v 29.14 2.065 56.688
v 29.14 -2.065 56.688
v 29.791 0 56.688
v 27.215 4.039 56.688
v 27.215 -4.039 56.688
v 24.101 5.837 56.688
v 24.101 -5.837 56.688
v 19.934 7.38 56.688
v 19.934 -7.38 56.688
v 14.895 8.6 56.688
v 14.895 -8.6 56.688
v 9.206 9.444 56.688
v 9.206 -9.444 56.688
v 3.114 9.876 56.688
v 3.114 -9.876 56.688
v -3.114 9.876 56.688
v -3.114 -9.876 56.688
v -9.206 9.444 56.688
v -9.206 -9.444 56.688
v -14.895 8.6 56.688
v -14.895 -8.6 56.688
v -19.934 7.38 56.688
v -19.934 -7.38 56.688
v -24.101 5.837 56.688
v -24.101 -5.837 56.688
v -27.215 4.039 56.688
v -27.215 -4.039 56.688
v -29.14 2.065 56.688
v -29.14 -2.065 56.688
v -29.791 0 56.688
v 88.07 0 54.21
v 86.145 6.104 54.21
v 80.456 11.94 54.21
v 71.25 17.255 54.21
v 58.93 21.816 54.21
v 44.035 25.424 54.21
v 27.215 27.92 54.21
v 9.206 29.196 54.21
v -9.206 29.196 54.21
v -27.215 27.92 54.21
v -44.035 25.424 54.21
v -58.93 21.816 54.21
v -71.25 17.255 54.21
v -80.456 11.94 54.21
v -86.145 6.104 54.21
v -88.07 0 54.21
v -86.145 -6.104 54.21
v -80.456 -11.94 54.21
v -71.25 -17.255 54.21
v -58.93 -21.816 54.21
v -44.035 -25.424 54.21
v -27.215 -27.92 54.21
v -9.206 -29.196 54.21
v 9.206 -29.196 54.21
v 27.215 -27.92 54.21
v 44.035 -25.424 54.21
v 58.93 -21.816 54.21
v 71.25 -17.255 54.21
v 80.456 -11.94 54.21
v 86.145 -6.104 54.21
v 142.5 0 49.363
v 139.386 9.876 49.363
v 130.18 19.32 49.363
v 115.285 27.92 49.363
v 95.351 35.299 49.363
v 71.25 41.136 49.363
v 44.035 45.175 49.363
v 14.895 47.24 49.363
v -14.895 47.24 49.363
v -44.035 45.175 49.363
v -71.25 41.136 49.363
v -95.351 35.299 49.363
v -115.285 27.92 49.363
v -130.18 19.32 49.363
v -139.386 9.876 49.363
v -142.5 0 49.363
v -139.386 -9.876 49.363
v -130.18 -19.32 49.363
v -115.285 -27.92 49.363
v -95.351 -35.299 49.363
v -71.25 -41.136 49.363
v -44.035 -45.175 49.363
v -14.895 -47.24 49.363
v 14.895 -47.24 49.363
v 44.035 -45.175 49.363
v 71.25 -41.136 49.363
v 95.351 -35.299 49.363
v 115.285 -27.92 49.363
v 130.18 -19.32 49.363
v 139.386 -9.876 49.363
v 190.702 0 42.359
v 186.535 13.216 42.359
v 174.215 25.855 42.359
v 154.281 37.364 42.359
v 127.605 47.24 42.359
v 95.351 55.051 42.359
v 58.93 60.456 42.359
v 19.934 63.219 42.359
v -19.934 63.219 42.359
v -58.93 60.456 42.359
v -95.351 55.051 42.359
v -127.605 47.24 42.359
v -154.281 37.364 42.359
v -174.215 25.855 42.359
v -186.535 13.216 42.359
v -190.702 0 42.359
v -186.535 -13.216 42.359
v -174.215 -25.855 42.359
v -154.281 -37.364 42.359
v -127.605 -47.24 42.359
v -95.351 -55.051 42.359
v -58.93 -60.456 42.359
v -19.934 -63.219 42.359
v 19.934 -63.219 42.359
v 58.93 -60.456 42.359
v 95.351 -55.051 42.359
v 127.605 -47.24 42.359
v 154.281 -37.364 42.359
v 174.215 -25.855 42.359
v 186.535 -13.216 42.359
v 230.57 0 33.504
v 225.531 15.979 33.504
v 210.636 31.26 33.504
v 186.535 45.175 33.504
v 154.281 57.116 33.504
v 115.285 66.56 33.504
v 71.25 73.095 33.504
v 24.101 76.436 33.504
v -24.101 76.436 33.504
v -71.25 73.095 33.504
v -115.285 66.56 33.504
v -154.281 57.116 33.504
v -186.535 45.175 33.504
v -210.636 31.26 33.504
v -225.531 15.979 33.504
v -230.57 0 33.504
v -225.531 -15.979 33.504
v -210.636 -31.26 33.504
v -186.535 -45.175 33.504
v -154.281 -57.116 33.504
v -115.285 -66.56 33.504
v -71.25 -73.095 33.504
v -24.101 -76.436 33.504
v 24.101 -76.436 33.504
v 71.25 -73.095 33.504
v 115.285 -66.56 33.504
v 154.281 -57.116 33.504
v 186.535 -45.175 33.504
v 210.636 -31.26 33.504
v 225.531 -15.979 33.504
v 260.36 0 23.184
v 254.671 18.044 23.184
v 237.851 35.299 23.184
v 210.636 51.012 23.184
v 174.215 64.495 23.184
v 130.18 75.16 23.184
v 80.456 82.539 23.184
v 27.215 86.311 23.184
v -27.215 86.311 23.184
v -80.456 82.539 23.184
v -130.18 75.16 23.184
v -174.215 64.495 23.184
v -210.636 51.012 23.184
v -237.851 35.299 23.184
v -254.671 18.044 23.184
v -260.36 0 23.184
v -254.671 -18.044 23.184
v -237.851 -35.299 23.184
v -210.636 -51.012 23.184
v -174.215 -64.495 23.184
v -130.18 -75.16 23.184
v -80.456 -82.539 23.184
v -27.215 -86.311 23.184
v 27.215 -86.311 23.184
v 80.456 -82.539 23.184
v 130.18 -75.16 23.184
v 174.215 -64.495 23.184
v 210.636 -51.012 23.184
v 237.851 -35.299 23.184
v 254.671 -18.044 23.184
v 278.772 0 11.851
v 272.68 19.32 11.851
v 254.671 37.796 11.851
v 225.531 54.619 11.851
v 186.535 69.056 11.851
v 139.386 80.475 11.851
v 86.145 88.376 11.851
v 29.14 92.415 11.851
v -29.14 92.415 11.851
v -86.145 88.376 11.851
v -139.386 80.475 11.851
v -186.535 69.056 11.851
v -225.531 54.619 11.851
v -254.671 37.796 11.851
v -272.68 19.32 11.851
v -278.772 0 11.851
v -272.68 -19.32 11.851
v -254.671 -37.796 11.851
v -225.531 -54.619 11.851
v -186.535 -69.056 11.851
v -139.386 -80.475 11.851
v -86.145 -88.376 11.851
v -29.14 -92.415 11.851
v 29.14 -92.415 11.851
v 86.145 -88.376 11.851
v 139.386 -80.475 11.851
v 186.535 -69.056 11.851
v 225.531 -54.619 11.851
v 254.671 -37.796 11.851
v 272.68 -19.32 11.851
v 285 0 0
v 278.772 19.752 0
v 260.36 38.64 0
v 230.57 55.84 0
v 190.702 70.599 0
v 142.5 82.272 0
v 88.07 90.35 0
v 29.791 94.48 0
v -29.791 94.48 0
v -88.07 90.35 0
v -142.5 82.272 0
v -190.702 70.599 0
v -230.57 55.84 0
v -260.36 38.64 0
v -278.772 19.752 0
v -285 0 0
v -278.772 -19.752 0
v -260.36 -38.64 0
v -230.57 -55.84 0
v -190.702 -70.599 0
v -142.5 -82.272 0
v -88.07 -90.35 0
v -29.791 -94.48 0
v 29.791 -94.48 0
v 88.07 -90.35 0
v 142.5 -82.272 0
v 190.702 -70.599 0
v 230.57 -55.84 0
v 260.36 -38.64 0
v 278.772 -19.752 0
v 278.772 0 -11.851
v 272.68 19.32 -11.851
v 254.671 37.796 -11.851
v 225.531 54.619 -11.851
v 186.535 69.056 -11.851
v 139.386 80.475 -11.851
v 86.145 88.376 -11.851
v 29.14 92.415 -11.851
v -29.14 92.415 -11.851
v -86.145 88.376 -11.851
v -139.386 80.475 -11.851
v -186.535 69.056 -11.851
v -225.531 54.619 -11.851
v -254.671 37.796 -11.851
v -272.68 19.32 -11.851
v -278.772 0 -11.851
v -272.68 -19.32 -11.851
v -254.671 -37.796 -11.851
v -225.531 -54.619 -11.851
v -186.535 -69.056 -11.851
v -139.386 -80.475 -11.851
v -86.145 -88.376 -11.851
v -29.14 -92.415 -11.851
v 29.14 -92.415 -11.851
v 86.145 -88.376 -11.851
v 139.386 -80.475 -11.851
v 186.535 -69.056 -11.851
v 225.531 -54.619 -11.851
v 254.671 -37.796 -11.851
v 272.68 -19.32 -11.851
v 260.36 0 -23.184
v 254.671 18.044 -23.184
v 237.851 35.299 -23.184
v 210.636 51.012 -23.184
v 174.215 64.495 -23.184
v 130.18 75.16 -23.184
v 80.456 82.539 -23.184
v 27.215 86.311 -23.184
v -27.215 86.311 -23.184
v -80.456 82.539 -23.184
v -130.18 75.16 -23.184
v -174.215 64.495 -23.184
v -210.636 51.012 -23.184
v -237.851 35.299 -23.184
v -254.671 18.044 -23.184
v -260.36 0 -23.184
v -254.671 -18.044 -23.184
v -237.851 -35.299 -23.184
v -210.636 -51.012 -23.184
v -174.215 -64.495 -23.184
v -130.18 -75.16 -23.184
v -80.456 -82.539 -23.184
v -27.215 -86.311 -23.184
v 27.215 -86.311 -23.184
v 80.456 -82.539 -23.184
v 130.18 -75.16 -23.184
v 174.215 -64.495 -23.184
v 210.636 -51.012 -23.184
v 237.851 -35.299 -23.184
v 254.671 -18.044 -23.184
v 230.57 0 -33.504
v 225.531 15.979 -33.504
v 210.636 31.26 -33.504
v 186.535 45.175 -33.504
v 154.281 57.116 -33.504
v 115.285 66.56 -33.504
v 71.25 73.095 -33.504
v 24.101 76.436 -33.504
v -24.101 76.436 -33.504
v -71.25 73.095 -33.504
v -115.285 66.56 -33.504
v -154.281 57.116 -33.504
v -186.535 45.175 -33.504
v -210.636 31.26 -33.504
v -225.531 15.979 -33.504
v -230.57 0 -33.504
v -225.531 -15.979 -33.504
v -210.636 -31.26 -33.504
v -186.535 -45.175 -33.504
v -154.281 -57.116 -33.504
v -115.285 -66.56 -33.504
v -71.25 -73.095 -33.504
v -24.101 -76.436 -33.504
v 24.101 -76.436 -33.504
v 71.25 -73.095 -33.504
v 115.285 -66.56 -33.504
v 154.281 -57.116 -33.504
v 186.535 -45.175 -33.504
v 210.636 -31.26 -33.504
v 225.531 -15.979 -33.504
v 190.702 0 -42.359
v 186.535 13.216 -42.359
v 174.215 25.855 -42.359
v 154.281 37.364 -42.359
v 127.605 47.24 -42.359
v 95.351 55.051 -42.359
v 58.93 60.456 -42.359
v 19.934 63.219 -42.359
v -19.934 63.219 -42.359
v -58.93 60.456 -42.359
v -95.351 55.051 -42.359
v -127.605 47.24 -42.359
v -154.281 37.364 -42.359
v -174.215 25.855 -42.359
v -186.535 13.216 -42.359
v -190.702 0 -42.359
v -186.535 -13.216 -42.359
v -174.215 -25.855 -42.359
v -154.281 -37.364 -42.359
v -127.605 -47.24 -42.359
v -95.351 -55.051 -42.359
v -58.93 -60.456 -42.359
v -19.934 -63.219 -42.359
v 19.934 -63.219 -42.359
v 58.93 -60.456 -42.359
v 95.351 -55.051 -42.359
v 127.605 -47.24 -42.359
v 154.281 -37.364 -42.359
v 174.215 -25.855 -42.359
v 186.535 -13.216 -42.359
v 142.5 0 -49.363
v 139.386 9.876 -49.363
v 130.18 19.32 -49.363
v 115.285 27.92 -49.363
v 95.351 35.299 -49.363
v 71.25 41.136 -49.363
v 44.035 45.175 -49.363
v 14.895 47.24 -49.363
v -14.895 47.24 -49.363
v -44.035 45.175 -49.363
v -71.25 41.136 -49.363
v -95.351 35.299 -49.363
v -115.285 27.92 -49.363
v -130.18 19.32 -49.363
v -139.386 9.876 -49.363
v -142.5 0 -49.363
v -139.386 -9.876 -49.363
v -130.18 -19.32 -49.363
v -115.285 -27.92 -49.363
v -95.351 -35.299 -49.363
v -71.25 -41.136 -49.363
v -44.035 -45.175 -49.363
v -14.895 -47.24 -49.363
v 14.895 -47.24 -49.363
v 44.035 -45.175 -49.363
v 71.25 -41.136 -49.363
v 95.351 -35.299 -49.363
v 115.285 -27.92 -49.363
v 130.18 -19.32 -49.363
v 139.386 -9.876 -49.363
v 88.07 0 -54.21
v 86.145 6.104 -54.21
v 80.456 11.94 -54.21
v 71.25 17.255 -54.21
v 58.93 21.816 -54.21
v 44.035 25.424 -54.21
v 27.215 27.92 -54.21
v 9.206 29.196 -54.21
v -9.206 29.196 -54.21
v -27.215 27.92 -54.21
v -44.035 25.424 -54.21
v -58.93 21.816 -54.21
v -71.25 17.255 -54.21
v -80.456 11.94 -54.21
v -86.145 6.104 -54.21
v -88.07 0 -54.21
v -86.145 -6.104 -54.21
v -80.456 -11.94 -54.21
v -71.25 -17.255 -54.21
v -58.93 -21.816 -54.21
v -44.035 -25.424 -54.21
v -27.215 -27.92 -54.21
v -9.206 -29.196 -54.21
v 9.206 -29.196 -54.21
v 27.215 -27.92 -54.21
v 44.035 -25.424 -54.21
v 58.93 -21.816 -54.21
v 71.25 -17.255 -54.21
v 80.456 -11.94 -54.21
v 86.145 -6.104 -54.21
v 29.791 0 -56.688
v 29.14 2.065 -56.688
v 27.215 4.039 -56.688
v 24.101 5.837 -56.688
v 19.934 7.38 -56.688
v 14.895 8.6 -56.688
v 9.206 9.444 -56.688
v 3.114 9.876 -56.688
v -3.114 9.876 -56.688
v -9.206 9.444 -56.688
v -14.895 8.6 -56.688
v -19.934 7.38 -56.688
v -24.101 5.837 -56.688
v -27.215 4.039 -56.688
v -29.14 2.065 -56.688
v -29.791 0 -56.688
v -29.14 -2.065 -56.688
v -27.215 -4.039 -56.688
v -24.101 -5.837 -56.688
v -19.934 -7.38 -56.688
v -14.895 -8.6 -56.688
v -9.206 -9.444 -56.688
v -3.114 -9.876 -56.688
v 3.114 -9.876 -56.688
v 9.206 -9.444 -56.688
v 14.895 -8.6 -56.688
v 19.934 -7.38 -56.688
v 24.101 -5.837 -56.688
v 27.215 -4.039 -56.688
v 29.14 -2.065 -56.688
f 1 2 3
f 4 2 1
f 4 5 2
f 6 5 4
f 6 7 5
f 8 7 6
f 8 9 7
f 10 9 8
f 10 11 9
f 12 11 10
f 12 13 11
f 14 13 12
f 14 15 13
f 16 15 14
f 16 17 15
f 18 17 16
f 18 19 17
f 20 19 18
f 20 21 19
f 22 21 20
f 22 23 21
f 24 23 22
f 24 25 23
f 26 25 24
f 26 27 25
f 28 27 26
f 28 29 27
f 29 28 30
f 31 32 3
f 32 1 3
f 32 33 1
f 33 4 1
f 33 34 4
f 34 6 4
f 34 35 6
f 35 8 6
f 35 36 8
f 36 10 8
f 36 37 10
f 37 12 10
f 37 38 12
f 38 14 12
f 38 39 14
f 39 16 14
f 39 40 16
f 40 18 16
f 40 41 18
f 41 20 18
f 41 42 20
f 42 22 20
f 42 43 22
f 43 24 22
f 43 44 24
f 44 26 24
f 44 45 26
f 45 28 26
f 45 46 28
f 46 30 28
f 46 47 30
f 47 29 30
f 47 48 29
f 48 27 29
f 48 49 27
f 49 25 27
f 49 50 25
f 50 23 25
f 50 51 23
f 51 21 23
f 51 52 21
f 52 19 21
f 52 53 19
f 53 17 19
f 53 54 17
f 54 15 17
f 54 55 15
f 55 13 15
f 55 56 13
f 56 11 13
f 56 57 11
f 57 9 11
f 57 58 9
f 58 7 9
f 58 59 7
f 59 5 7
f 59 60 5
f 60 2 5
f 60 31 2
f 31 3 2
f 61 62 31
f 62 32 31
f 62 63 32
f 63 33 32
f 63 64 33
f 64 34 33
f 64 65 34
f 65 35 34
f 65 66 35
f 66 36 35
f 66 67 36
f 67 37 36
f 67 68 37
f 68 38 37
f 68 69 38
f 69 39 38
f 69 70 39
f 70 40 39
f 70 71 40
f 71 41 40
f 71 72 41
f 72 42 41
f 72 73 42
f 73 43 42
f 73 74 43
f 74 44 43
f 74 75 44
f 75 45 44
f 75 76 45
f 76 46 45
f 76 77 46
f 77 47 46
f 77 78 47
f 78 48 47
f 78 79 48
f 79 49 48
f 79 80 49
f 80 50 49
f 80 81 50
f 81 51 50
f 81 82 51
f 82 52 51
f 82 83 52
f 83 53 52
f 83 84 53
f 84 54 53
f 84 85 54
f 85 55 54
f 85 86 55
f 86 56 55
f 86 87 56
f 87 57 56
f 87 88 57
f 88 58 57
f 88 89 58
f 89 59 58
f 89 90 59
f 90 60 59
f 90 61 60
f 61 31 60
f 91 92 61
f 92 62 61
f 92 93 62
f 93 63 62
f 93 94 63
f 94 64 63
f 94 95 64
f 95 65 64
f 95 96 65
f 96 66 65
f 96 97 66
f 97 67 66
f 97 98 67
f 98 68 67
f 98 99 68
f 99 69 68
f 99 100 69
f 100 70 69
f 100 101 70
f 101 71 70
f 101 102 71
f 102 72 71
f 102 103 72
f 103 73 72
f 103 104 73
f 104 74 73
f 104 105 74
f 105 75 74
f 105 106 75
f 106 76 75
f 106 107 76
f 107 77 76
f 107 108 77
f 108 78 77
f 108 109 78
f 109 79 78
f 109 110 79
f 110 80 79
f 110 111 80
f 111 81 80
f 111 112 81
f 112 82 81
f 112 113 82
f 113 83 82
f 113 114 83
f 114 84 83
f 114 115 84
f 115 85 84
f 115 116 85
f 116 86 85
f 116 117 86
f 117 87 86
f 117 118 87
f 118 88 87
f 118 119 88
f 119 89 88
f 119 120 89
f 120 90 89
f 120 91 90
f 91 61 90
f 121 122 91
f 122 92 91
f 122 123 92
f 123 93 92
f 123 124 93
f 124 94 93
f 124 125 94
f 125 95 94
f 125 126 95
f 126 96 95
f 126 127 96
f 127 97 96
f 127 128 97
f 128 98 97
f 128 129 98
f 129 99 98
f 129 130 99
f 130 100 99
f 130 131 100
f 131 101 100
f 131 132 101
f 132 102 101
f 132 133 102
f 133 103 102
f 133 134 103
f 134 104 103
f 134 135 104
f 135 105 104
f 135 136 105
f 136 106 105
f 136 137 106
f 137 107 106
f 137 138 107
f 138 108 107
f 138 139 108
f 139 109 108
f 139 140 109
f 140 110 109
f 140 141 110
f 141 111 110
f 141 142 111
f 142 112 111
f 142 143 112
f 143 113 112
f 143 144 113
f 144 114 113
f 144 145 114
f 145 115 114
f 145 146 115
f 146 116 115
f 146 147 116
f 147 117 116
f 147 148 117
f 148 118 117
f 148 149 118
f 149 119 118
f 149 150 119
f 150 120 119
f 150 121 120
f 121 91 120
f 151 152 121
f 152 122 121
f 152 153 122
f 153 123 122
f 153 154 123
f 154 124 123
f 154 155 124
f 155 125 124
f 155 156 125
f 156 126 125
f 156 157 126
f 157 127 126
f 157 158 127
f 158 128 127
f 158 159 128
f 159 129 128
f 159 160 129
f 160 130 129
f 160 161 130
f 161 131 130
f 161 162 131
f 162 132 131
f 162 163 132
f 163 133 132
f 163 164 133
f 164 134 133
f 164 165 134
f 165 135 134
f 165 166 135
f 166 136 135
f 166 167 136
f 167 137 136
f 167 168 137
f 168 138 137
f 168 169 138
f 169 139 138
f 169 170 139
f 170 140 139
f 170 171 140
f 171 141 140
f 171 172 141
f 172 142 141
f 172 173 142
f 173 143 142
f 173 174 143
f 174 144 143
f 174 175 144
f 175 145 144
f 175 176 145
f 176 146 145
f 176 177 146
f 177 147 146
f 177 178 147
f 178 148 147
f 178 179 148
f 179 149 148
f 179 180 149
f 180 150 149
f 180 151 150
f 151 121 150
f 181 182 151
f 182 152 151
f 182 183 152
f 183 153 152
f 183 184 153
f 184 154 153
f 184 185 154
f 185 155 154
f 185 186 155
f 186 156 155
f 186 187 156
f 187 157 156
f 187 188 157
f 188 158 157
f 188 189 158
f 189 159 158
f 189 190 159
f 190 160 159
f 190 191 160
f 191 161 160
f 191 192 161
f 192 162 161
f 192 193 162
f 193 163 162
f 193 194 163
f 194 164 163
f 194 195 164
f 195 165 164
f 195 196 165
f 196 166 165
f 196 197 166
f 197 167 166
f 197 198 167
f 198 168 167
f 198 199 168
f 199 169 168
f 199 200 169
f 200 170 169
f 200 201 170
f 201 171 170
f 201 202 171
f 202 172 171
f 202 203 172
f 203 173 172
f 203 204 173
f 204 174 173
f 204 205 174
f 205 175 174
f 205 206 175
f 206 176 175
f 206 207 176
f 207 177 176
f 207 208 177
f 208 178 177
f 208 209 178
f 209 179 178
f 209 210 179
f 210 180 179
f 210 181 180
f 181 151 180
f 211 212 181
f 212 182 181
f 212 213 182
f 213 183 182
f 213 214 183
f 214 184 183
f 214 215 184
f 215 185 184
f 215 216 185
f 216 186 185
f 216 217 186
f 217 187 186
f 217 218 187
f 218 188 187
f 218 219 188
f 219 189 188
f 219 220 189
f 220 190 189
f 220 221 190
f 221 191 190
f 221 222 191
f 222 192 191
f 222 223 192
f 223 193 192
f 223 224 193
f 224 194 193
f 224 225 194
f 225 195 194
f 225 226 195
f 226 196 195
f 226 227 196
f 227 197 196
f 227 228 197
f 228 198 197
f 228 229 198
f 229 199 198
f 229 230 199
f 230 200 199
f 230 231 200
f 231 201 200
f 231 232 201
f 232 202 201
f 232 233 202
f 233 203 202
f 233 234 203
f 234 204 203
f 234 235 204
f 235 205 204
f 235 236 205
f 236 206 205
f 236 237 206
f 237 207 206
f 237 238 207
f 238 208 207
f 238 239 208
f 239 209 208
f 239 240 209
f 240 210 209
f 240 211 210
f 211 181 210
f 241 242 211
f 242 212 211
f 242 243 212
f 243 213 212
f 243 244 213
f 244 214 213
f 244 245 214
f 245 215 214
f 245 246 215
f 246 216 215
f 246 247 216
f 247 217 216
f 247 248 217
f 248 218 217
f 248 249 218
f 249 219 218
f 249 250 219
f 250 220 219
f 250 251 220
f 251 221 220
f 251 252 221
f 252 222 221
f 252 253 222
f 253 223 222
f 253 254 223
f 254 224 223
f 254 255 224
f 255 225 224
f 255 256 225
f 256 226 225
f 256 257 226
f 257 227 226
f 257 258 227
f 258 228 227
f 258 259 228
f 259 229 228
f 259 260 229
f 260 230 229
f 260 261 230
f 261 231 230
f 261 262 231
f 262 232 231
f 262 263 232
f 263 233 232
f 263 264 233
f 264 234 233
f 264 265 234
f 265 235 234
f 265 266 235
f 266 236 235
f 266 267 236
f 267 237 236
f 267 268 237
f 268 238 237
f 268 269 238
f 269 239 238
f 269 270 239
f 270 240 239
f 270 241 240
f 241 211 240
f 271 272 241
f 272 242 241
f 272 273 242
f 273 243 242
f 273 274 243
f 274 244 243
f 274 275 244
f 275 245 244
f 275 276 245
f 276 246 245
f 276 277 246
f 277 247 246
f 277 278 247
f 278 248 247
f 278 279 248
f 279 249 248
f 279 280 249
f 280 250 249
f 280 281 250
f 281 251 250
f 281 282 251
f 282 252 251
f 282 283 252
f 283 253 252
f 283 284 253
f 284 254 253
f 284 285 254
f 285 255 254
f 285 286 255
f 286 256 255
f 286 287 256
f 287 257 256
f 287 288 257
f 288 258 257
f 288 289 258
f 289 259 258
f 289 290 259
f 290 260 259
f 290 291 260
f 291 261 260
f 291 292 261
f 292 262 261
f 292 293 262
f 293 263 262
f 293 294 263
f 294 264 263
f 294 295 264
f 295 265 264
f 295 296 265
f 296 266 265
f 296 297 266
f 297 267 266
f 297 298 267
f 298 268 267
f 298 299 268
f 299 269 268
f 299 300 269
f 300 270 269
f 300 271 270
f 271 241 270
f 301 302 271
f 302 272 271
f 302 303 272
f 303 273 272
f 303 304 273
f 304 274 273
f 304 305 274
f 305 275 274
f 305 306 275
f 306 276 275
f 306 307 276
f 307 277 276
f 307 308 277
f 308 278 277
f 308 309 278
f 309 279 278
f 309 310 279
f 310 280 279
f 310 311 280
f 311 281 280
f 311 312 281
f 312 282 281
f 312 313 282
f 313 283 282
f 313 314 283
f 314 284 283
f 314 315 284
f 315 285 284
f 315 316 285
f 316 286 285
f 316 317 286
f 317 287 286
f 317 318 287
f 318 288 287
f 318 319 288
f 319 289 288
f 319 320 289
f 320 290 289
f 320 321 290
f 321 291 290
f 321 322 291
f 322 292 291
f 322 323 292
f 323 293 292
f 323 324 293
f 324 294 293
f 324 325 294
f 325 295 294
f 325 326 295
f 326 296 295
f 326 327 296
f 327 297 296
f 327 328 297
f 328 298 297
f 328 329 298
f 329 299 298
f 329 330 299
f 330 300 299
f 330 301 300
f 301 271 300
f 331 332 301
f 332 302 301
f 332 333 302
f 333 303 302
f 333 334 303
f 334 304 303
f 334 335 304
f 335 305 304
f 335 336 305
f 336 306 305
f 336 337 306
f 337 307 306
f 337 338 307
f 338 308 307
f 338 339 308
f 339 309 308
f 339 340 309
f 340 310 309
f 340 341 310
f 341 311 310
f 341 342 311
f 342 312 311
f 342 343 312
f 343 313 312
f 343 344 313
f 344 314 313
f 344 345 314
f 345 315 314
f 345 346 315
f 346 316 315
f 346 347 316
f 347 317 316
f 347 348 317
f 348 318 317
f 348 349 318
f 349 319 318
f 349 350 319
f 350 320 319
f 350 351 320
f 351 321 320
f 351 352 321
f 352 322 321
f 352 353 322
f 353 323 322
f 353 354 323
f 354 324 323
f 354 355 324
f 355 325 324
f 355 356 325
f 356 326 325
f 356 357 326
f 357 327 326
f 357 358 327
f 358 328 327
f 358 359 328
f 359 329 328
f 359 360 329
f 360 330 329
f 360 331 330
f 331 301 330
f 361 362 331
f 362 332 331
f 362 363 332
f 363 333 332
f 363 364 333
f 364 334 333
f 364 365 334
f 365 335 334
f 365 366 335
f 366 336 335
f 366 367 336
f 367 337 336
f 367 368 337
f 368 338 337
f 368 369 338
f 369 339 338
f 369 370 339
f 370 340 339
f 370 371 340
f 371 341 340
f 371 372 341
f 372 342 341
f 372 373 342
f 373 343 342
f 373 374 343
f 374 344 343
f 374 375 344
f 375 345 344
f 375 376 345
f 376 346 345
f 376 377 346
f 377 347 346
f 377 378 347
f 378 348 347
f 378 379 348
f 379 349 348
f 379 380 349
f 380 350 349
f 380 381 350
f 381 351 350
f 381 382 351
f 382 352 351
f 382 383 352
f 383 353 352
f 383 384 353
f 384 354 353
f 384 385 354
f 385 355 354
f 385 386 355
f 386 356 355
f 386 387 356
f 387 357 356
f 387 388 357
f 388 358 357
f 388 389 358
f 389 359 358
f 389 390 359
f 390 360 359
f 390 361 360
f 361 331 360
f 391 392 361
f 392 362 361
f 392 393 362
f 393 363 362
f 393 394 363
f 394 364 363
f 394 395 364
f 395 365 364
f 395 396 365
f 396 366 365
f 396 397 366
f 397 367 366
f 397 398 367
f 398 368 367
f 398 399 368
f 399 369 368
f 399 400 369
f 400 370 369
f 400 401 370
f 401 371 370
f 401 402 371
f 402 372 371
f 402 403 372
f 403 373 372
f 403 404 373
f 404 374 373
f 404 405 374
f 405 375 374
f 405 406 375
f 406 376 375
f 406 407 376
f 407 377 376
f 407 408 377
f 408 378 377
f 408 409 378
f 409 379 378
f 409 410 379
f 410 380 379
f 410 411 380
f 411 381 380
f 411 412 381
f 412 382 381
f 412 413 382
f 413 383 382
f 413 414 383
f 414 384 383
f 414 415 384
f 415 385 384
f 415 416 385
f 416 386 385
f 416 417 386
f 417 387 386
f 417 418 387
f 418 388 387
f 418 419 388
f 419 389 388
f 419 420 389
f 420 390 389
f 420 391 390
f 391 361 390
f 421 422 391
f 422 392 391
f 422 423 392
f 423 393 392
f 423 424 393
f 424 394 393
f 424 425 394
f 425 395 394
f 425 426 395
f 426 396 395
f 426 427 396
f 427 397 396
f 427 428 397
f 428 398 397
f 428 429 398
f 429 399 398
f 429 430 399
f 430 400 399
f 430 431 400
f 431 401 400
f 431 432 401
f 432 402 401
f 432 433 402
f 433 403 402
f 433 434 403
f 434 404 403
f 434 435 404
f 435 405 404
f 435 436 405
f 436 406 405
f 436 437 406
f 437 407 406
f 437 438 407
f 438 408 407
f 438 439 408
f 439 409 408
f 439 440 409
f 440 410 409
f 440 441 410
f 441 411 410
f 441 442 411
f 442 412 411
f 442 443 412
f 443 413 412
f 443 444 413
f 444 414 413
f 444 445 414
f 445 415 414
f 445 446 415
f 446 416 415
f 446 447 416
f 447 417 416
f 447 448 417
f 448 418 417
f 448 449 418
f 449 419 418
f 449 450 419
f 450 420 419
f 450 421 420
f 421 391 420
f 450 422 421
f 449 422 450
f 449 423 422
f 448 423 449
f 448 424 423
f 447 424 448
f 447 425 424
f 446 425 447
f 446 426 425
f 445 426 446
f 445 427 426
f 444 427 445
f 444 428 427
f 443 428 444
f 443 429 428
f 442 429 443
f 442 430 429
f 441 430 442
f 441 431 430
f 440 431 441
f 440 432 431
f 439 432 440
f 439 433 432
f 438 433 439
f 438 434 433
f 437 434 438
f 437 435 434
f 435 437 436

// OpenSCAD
// Generated by SolidPython 1.0.1 on 2020-07-29 00:46:51


scale(v = [15, 5, 3]) {
	sphere(r = 19);
}
/***********************************************
*********      SolidPython code:      **********
************************************************
 
# import packages: SolidPython
from solid import *
from solid.utils import *
from itertools import chain, combinations, permutations


class Resize:

    def __init__(self, scad_file):
        self.scad_file = scad_file
        #self.scad_file = import_scad(scad_file)
        # cone/cylinder param:
        self.r1 = 0
        self.r2 = 0
        self.h = 0
        # rectangular prism param:
        self.w = 0
        self.l = 0
        # ellipse param:
        self.r = 0

    # import OpenScad code (file name corresponds to shape)


    # classify shape + parameters
    def assign(self, param1, param2, param3):
        if self.scad_file == 'cone.scad':
            self.r1 = param1
            self.r2 = param2
            self.h = param3
        elif self.scad_file == 'cylinder.scad':
            self.r1 = param1
            self.r2 = param2
            self.h = param3
        elif self.scad_file == 'rectangularPrism.scad':
            self.h = param1
            self.l = param2
            self.w = param3
        else:
            self.r = param1
            self.h = param2

    # resize parameters
    def iterate(self):
        x = range(3, 20, 2)
        i = 1
        if self.scad_file == 'cone.scad':
            tempList = list(permutations(x, 2))
            for temp in tempList:
                param1 = temp[0]
                param2 = temp[1]
                filepath = 'produced_scad_files/' + 'cone' + str(param1) + '_' + str(param2) + '_' + '.scad'
                scad_render_to_file(cylinder(h=param1, r1=param2, r2=0), filepath)

        elif self.scad_file == 'cylinder.scad':
            tempList = list(permutations(x, 3))
            for temp in tempList:
                param1 = temp[0]
                param2 = temp[1]
                filepath = 'produced_scad_files/' + 'cylinder' + str(param1) + '_' + str(param2) + '_' + '.scad'
                scad_render_to_file(cylinder(h=param1, r1=param2, r2=param2), filepath)

        elif self.scad_file == 'rectangularPrism.scad':
            tempList = list(permutations(x, 3))
            for temp in tempList:
                param1 = temp[0]
                param2 = temp[1]
                param3 = temp[2]
                filepath = 'produced_scad_files/' + 'rectangularPrism' + str(param1) + '_' + str(param2) + '_' + str(
                    param3) + '.scad'
                scad_render_to_file(cube(size=(param1, param2, param3)), filepath)

        elif self.scad_file == 'ellipse.scad':
            tempList = list(permutations(x, 4))
            for temp in tempList:
                param1 = temp[0]
                param2 = temp[1]
                param3 = temp[2]
                param4 = temp[3]
                filepath = 'produced_scad_files/' + 'ellipse' + str(param1) + '_' + str(param2) + '_' + str(param3) + '_' + str(param4) + '.scad'
                scad_render_to_file(scale([param1, param2, param3])(sphere(r=param4)), filepath)

    def render_to_scadfile(self):
        scad_render_to_file(scad, 'example.scad') 
 
************************************************/
